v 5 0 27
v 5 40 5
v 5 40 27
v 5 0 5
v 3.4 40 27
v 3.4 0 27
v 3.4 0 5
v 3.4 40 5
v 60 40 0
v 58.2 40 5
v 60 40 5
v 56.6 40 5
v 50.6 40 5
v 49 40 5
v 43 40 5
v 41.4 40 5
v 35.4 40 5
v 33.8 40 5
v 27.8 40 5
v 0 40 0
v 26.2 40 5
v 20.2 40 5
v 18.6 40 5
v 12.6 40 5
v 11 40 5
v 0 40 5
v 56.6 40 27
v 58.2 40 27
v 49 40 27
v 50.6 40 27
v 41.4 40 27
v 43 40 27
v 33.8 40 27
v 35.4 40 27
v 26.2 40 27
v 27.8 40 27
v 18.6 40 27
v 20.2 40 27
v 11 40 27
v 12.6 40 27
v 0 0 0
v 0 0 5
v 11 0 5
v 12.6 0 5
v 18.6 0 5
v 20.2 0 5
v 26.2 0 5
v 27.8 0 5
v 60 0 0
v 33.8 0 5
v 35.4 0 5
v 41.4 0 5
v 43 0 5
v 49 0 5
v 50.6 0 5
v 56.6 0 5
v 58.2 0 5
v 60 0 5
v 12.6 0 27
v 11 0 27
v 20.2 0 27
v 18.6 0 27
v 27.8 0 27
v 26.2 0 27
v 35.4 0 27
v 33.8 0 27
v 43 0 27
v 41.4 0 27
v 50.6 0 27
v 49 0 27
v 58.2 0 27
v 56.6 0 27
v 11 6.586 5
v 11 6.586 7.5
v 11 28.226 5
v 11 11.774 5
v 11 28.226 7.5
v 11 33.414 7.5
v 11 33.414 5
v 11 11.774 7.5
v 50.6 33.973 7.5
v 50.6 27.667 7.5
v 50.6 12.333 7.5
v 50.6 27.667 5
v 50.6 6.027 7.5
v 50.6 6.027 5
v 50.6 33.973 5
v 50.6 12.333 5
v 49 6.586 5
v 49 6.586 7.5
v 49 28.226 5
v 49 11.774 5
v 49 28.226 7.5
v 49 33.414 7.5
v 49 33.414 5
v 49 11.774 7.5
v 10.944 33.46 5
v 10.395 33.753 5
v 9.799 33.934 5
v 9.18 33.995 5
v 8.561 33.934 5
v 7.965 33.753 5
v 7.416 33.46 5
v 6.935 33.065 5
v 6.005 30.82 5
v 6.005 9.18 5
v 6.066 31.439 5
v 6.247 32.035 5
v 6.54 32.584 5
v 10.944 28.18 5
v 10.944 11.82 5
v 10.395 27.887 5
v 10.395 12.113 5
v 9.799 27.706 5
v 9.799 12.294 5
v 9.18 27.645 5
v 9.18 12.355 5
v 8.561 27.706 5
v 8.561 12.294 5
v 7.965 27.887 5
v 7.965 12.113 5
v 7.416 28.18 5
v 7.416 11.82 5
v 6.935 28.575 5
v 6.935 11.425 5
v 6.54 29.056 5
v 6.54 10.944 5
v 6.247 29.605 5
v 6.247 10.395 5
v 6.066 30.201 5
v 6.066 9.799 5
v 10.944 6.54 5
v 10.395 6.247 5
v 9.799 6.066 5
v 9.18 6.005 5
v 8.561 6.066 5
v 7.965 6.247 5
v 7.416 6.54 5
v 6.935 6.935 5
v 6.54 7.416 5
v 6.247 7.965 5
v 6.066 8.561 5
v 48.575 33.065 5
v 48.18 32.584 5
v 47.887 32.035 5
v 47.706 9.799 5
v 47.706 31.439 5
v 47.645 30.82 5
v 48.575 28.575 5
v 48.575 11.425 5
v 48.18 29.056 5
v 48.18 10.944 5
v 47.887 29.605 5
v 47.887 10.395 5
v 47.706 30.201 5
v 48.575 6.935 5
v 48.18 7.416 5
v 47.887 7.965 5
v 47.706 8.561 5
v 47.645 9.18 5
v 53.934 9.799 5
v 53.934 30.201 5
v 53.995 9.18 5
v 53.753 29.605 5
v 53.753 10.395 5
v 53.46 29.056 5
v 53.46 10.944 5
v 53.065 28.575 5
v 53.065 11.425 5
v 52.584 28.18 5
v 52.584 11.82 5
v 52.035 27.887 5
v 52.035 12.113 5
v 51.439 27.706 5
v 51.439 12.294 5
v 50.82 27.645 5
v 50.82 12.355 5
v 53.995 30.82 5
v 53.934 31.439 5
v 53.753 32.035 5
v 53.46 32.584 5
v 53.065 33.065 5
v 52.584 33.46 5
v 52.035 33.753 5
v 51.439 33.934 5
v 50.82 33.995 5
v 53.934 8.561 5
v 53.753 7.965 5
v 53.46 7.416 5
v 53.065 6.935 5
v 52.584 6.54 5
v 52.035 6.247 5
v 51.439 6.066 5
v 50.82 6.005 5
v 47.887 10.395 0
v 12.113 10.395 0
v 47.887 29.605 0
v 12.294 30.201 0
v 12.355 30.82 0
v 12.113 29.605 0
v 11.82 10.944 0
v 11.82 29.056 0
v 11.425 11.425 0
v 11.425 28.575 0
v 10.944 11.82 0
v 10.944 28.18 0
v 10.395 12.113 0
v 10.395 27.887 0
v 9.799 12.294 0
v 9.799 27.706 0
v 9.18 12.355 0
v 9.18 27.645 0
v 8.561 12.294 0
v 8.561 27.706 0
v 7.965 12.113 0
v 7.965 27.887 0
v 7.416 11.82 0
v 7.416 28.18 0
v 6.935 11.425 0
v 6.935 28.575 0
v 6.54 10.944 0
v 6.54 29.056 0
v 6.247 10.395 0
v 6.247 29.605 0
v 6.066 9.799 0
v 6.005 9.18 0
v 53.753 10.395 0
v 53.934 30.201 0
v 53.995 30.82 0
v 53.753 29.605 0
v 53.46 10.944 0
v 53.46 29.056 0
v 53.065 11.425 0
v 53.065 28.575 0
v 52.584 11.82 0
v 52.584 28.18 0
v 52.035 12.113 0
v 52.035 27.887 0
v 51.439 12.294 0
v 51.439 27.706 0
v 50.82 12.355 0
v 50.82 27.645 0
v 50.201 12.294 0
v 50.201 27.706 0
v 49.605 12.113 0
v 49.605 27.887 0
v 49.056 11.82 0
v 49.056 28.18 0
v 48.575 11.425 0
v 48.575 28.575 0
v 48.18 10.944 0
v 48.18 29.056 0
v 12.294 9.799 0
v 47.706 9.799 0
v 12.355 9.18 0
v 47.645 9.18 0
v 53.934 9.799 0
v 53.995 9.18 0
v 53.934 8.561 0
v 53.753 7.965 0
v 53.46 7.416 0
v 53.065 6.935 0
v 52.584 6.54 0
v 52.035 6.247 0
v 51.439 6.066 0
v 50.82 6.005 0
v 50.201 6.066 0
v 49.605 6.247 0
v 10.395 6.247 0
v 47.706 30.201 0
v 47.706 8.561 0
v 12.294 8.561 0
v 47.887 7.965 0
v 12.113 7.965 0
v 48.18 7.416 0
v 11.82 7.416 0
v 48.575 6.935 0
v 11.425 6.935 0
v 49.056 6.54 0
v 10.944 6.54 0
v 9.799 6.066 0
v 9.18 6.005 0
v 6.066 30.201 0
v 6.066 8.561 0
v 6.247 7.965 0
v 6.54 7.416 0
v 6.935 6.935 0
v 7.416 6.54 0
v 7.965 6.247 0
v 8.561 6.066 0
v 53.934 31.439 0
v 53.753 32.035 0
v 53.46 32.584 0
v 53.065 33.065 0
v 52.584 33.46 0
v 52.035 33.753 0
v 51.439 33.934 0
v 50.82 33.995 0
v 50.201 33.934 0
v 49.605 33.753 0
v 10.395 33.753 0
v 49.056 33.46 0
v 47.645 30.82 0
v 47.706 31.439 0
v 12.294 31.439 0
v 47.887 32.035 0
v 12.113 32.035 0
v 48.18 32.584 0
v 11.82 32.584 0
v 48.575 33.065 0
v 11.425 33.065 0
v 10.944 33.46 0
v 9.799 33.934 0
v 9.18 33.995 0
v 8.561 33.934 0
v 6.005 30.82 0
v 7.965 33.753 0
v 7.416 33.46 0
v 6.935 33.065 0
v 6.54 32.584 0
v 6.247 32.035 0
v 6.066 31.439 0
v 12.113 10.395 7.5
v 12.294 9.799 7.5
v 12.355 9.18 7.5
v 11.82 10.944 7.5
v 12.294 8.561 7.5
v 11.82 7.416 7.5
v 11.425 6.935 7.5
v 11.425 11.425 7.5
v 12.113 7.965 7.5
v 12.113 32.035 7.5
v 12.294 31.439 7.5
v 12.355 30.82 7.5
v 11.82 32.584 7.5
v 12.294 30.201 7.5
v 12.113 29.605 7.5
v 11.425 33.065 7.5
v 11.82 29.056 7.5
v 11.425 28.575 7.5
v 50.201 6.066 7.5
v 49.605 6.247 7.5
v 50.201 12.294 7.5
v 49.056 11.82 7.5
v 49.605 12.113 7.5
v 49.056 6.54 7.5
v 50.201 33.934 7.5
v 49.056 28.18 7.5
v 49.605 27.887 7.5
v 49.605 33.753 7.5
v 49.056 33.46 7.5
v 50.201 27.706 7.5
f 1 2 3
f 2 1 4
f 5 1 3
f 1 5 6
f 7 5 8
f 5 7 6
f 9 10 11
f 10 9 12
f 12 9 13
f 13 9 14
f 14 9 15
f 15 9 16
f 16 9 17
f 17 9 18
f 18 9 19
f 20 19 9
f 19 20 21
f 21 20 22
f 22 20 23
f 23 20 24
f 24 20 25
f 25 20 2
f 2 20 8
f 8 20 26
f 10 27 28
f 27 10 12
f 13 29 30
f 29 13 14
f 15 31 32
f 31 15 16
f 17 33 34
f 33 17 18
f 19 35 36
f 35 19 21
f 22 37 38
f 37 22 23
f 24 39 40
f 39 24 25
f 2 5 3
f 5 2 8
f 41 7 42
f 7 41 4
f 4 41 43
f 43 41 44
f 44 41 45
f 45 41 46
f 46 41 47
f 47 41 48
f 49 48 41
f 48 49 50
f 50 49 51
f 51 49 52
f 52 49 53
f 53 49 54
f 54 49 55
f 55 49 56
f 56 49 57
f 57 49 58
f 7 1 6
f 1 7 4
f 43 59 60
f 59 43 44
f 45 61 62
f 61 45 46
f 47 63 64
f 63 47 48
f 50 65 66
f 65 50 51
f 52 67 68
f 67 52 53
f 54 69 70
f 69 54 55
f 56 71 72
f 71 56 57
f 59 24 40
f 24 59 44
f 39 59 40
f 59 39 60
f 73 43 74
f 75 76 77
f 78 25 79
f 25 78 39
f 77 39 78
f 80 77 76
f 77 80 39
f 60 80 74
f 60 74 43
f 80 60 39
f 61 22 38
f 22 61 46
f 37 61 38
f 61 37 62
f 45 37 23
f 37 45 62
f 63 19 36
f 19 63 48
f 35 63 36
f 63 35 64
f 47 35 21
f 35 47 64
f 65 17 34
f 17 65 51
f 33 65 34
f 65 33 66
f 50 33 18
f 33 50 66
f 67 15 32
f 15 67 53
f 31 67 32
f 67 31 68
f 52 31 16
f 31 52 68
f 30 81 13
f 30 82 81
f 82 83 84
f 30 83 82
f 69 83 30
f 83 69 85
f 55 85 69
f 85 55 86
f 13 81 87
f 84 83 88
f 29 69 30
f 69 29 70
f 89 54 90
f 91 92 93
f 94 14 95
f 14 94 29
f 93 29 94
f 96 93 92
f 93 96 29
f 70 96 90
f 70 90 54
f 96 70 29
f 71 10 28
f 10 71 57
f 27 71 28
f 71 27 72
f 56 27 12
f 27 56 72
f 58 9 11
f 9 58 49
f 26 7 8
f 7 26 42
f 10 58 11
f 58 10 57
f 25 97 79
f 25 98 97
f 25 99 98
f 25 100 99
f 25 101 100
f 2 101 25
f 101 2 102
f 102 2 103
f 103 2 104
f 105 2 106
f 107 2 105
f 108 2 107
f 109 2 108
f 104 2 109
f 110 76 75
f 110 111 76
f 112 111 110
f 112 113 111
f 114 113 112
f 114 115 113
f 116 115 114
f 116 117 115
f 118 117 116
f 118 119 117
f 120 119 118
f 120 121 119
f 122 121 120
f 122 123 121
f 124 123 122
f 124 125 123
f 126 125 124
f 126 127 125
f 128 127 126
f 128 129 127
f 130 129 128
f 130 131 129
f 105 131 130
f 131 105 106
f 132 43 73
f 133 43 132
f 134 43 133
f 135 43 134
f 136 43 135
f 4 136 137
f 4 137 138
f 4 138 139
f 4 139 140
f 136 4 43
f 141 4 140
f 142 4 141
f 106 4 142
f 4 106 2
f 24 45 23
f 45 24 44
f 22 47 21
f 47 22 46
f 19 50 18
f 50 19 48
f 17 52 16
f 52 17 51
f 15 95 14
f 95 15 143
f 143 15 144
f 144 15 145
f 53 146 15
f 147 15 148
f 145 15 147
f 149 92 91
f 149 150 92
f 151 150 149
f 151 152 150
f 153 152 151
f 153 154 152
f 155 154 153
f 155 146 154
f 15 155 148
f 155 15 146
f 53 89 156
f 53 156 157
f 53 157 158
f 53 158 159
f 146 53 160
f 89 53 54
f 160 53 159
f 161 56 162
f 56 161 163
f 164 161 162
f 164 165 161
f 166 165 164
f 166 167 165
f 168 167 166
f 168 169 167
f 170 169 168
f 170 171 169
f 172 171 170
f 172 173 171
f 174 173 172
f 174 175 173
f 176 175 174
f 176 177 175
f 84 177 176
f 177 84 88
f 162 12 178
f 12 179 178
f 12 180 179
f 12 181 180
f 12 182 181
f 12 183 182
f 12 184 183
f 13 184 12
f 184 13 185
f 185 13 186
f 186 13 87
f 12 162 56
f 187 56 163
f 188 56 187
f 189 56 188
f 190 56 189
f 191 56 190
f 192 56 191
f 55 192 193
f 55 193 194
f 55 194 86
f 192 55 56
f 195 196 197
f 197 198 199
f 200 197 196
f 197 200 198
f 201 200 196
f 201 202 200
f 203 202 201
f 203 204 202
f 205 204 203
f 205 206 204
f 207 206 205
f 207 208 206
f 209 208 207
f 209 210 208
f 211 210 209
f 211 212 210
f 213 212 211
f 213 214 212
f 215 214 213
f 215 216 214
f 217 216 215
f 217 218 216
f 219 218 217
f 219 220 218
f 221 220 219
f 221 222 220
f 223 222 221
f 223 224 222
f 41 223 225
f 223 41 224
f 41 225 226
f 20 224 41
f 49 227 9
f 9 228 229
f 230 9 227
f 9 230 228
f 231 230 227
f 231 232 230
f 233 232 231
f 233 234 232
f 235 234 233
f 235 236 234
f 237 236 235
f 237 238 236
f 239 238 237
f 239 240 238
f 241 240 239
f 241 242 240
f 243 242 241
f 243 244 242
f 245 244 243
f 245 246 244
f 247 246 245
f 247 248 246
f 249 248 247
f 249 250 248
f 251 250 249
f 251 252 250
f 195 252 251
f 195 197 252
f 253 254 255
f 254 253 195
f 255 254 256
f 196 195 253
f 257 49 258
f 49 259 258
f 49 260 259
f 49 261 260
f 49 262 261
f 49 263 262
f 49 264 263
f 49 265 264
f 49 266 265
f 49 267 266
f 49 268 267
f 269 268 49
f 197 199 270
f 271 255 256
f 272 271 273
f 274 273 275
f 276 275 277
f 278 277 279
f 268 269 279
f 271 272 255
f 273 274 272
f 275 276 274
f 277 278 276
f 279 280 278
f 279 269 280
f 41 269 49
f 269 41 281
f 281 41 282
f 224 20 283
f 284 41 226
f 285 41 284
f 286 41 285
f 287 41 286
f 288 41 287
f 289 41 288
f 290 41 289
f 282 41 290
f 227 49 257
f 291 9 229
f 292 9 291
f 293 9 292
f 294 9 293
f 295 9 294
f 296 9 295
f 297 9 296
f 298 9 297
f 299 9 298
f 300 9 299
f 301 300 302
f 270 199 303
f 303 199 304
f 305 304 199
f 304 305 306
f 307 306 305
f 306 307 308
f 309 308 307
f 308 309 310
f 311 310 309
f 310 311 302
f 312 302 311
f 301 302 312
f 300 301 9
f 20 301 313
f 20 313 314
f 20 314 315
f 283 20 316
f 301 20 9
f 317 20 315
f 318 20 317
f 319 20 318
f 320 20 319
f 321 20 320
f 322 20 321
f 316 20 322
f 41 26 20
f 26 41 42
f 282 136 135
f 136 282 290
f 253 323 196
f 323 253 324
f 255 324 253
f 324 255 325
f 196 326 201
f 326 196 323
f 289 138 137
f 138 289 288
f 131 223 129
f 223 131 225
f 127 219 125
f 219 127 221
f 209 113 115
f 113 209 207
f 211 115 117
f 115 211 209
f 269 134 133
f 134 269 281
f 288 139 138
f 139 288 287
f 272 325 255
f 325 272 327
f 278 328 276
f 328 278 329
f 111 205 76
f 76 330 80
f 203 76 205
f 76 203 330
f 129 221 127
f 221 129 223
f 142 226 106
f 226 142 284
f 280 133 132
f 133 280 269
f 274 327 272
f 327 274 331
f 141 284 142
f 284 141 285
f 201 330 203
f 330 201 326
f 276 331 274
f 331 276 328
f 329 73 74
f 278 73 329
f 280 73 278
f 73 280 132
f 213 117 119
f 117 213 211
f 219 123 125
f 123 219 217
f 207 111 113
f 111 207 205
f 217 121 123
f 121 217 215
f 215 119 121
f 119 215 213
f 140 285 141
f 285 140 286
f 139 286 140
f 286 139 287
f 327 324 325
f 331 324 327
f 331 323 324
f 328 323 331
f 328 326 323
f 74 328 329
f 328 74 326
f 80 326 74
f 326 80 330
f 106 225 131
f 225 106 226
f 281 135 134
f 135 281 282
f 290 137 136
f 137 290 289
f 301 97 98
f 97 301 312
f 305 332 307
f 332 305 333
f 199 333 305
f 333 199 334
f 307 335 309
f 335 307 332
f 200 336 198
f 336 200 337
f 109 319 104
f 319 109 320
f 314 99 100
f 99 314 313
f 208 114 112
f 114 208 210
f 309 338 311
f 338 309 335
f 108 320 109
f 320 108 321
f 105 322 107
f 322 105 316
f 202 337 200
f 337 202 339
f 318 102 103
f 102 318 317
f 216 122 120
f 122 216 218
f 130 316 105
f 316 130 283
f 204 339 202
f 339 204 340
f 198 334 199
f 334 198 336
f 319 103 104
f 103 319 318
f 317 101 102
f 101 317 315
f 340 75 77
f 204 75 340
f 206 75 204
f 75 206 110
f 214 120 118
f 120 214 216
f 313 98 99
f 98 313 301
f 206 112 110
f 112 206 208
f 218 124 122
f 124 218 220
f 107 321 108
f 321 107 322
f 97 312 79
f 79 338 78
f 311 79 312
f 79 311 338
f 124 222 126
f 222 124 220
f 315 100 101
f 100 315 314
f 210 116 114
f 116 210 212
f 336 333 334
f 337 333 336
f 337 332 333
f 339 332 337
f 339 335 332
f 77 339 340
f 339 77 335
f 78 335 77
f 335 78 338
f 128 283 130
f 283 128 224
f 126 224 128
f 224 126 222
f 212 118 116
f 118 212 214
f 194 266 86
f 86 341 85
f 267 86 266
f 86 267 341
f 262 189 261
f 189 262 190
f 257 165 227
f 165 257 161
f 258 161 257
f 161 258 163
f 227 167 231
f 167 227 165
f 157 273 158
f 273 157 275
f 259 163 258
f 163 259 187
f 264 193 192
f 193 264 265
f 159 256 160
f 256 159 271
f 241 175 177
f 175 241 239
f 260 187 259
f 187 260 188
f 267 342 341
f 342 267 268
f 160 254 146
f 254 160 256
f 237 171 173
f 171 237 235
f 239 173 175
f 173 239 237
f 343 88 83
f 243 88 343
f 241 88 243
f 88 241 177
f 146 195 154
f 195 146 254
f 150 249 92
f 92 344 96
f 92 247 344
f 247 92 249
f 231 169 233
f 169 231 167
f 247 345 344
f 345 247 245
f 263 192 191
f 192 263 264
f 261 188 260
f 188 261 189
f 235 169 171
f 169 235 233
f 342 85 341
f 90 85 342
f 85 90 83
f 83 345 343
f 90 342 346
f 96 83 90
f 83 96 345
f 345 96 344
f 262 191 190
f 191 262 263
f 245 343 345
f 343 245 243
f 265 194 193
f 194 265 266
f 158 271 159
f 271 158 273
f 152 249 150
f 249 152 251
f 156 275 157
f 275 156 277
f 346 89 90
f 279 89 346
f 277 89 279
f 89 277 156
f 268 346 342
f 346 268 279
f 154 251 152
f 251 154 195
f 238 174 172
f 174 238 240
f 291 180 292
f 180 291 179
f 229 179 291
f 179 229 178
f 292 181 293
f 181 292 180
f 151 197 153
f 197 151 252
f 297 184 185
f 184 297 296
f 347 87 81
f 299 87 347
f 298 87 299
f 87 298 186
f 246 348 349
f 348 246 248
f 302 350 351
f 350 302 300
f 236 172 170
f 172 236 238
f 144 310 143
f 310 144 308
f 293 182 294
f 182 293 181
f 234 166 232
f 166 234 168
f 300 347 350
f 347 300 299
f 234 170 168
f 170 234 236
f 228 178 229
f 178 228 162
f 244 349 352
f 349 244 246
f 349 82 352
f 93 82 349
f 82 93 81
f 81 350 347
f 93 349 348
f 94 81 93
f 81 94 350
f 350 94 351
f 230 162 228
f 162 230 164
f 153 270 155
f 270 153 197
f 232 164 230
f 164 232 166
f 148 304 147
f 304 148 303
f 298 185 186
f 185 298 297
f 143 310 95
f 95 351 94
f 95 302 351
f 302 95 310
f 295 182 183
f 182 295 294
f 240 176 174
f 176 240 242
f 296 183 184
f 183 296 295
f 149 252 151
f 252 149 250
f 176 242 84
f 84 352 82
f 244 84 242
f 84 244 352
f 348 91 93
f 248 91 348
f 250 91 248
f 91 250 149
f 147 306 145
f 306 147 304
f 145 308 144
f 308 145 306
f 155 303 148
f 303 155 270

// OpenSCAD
$fn = 32;

// ----------------------------------------------------------------------
// Finned heat sink: 60 x 40 mm base, 22 mm fins
// ----------------------------------------------------------------------

// --- parameters (mm) ---
base_w = 60;              // base width
base_d = 40;              // base depth
base_t = 5;               // base thickness
fin_h = 22;               // fin height above the base
holes_d = 6.35;           // fixing holes
hole_x = 20.82;           // hole offset in x
hole_y = 10.82;           // hole offset in y
fin_t = 1.6;              // fin thickness
fin_pitch = 7.6;          // fin pitch
fin_count = 8;            // number of fins
fin_x0 = 3.4;             // first fin offset

difference() {
  union() {
    cube([base_w, base_d, base_t]);
    for (i = [0 : fin_count - 1]) {
      translate([fin_x0 + i * fin_pitch, 0, base_t - 0.5]) cube([fin_t, base_d, fin_h + 0.5]);
    }
  }
  /* fixing holes through the base, 2.5 mm clear on both sides */
  for (hx = [-20.82, 20.82]) {
    for (hy = [-10.82, 10.82]) {
      translate([base_w / 2 + hx, base_d / 2 + hy, -2.5]) cylinder(h = base_t + 5, d = holes_d);
    }
  }
}
